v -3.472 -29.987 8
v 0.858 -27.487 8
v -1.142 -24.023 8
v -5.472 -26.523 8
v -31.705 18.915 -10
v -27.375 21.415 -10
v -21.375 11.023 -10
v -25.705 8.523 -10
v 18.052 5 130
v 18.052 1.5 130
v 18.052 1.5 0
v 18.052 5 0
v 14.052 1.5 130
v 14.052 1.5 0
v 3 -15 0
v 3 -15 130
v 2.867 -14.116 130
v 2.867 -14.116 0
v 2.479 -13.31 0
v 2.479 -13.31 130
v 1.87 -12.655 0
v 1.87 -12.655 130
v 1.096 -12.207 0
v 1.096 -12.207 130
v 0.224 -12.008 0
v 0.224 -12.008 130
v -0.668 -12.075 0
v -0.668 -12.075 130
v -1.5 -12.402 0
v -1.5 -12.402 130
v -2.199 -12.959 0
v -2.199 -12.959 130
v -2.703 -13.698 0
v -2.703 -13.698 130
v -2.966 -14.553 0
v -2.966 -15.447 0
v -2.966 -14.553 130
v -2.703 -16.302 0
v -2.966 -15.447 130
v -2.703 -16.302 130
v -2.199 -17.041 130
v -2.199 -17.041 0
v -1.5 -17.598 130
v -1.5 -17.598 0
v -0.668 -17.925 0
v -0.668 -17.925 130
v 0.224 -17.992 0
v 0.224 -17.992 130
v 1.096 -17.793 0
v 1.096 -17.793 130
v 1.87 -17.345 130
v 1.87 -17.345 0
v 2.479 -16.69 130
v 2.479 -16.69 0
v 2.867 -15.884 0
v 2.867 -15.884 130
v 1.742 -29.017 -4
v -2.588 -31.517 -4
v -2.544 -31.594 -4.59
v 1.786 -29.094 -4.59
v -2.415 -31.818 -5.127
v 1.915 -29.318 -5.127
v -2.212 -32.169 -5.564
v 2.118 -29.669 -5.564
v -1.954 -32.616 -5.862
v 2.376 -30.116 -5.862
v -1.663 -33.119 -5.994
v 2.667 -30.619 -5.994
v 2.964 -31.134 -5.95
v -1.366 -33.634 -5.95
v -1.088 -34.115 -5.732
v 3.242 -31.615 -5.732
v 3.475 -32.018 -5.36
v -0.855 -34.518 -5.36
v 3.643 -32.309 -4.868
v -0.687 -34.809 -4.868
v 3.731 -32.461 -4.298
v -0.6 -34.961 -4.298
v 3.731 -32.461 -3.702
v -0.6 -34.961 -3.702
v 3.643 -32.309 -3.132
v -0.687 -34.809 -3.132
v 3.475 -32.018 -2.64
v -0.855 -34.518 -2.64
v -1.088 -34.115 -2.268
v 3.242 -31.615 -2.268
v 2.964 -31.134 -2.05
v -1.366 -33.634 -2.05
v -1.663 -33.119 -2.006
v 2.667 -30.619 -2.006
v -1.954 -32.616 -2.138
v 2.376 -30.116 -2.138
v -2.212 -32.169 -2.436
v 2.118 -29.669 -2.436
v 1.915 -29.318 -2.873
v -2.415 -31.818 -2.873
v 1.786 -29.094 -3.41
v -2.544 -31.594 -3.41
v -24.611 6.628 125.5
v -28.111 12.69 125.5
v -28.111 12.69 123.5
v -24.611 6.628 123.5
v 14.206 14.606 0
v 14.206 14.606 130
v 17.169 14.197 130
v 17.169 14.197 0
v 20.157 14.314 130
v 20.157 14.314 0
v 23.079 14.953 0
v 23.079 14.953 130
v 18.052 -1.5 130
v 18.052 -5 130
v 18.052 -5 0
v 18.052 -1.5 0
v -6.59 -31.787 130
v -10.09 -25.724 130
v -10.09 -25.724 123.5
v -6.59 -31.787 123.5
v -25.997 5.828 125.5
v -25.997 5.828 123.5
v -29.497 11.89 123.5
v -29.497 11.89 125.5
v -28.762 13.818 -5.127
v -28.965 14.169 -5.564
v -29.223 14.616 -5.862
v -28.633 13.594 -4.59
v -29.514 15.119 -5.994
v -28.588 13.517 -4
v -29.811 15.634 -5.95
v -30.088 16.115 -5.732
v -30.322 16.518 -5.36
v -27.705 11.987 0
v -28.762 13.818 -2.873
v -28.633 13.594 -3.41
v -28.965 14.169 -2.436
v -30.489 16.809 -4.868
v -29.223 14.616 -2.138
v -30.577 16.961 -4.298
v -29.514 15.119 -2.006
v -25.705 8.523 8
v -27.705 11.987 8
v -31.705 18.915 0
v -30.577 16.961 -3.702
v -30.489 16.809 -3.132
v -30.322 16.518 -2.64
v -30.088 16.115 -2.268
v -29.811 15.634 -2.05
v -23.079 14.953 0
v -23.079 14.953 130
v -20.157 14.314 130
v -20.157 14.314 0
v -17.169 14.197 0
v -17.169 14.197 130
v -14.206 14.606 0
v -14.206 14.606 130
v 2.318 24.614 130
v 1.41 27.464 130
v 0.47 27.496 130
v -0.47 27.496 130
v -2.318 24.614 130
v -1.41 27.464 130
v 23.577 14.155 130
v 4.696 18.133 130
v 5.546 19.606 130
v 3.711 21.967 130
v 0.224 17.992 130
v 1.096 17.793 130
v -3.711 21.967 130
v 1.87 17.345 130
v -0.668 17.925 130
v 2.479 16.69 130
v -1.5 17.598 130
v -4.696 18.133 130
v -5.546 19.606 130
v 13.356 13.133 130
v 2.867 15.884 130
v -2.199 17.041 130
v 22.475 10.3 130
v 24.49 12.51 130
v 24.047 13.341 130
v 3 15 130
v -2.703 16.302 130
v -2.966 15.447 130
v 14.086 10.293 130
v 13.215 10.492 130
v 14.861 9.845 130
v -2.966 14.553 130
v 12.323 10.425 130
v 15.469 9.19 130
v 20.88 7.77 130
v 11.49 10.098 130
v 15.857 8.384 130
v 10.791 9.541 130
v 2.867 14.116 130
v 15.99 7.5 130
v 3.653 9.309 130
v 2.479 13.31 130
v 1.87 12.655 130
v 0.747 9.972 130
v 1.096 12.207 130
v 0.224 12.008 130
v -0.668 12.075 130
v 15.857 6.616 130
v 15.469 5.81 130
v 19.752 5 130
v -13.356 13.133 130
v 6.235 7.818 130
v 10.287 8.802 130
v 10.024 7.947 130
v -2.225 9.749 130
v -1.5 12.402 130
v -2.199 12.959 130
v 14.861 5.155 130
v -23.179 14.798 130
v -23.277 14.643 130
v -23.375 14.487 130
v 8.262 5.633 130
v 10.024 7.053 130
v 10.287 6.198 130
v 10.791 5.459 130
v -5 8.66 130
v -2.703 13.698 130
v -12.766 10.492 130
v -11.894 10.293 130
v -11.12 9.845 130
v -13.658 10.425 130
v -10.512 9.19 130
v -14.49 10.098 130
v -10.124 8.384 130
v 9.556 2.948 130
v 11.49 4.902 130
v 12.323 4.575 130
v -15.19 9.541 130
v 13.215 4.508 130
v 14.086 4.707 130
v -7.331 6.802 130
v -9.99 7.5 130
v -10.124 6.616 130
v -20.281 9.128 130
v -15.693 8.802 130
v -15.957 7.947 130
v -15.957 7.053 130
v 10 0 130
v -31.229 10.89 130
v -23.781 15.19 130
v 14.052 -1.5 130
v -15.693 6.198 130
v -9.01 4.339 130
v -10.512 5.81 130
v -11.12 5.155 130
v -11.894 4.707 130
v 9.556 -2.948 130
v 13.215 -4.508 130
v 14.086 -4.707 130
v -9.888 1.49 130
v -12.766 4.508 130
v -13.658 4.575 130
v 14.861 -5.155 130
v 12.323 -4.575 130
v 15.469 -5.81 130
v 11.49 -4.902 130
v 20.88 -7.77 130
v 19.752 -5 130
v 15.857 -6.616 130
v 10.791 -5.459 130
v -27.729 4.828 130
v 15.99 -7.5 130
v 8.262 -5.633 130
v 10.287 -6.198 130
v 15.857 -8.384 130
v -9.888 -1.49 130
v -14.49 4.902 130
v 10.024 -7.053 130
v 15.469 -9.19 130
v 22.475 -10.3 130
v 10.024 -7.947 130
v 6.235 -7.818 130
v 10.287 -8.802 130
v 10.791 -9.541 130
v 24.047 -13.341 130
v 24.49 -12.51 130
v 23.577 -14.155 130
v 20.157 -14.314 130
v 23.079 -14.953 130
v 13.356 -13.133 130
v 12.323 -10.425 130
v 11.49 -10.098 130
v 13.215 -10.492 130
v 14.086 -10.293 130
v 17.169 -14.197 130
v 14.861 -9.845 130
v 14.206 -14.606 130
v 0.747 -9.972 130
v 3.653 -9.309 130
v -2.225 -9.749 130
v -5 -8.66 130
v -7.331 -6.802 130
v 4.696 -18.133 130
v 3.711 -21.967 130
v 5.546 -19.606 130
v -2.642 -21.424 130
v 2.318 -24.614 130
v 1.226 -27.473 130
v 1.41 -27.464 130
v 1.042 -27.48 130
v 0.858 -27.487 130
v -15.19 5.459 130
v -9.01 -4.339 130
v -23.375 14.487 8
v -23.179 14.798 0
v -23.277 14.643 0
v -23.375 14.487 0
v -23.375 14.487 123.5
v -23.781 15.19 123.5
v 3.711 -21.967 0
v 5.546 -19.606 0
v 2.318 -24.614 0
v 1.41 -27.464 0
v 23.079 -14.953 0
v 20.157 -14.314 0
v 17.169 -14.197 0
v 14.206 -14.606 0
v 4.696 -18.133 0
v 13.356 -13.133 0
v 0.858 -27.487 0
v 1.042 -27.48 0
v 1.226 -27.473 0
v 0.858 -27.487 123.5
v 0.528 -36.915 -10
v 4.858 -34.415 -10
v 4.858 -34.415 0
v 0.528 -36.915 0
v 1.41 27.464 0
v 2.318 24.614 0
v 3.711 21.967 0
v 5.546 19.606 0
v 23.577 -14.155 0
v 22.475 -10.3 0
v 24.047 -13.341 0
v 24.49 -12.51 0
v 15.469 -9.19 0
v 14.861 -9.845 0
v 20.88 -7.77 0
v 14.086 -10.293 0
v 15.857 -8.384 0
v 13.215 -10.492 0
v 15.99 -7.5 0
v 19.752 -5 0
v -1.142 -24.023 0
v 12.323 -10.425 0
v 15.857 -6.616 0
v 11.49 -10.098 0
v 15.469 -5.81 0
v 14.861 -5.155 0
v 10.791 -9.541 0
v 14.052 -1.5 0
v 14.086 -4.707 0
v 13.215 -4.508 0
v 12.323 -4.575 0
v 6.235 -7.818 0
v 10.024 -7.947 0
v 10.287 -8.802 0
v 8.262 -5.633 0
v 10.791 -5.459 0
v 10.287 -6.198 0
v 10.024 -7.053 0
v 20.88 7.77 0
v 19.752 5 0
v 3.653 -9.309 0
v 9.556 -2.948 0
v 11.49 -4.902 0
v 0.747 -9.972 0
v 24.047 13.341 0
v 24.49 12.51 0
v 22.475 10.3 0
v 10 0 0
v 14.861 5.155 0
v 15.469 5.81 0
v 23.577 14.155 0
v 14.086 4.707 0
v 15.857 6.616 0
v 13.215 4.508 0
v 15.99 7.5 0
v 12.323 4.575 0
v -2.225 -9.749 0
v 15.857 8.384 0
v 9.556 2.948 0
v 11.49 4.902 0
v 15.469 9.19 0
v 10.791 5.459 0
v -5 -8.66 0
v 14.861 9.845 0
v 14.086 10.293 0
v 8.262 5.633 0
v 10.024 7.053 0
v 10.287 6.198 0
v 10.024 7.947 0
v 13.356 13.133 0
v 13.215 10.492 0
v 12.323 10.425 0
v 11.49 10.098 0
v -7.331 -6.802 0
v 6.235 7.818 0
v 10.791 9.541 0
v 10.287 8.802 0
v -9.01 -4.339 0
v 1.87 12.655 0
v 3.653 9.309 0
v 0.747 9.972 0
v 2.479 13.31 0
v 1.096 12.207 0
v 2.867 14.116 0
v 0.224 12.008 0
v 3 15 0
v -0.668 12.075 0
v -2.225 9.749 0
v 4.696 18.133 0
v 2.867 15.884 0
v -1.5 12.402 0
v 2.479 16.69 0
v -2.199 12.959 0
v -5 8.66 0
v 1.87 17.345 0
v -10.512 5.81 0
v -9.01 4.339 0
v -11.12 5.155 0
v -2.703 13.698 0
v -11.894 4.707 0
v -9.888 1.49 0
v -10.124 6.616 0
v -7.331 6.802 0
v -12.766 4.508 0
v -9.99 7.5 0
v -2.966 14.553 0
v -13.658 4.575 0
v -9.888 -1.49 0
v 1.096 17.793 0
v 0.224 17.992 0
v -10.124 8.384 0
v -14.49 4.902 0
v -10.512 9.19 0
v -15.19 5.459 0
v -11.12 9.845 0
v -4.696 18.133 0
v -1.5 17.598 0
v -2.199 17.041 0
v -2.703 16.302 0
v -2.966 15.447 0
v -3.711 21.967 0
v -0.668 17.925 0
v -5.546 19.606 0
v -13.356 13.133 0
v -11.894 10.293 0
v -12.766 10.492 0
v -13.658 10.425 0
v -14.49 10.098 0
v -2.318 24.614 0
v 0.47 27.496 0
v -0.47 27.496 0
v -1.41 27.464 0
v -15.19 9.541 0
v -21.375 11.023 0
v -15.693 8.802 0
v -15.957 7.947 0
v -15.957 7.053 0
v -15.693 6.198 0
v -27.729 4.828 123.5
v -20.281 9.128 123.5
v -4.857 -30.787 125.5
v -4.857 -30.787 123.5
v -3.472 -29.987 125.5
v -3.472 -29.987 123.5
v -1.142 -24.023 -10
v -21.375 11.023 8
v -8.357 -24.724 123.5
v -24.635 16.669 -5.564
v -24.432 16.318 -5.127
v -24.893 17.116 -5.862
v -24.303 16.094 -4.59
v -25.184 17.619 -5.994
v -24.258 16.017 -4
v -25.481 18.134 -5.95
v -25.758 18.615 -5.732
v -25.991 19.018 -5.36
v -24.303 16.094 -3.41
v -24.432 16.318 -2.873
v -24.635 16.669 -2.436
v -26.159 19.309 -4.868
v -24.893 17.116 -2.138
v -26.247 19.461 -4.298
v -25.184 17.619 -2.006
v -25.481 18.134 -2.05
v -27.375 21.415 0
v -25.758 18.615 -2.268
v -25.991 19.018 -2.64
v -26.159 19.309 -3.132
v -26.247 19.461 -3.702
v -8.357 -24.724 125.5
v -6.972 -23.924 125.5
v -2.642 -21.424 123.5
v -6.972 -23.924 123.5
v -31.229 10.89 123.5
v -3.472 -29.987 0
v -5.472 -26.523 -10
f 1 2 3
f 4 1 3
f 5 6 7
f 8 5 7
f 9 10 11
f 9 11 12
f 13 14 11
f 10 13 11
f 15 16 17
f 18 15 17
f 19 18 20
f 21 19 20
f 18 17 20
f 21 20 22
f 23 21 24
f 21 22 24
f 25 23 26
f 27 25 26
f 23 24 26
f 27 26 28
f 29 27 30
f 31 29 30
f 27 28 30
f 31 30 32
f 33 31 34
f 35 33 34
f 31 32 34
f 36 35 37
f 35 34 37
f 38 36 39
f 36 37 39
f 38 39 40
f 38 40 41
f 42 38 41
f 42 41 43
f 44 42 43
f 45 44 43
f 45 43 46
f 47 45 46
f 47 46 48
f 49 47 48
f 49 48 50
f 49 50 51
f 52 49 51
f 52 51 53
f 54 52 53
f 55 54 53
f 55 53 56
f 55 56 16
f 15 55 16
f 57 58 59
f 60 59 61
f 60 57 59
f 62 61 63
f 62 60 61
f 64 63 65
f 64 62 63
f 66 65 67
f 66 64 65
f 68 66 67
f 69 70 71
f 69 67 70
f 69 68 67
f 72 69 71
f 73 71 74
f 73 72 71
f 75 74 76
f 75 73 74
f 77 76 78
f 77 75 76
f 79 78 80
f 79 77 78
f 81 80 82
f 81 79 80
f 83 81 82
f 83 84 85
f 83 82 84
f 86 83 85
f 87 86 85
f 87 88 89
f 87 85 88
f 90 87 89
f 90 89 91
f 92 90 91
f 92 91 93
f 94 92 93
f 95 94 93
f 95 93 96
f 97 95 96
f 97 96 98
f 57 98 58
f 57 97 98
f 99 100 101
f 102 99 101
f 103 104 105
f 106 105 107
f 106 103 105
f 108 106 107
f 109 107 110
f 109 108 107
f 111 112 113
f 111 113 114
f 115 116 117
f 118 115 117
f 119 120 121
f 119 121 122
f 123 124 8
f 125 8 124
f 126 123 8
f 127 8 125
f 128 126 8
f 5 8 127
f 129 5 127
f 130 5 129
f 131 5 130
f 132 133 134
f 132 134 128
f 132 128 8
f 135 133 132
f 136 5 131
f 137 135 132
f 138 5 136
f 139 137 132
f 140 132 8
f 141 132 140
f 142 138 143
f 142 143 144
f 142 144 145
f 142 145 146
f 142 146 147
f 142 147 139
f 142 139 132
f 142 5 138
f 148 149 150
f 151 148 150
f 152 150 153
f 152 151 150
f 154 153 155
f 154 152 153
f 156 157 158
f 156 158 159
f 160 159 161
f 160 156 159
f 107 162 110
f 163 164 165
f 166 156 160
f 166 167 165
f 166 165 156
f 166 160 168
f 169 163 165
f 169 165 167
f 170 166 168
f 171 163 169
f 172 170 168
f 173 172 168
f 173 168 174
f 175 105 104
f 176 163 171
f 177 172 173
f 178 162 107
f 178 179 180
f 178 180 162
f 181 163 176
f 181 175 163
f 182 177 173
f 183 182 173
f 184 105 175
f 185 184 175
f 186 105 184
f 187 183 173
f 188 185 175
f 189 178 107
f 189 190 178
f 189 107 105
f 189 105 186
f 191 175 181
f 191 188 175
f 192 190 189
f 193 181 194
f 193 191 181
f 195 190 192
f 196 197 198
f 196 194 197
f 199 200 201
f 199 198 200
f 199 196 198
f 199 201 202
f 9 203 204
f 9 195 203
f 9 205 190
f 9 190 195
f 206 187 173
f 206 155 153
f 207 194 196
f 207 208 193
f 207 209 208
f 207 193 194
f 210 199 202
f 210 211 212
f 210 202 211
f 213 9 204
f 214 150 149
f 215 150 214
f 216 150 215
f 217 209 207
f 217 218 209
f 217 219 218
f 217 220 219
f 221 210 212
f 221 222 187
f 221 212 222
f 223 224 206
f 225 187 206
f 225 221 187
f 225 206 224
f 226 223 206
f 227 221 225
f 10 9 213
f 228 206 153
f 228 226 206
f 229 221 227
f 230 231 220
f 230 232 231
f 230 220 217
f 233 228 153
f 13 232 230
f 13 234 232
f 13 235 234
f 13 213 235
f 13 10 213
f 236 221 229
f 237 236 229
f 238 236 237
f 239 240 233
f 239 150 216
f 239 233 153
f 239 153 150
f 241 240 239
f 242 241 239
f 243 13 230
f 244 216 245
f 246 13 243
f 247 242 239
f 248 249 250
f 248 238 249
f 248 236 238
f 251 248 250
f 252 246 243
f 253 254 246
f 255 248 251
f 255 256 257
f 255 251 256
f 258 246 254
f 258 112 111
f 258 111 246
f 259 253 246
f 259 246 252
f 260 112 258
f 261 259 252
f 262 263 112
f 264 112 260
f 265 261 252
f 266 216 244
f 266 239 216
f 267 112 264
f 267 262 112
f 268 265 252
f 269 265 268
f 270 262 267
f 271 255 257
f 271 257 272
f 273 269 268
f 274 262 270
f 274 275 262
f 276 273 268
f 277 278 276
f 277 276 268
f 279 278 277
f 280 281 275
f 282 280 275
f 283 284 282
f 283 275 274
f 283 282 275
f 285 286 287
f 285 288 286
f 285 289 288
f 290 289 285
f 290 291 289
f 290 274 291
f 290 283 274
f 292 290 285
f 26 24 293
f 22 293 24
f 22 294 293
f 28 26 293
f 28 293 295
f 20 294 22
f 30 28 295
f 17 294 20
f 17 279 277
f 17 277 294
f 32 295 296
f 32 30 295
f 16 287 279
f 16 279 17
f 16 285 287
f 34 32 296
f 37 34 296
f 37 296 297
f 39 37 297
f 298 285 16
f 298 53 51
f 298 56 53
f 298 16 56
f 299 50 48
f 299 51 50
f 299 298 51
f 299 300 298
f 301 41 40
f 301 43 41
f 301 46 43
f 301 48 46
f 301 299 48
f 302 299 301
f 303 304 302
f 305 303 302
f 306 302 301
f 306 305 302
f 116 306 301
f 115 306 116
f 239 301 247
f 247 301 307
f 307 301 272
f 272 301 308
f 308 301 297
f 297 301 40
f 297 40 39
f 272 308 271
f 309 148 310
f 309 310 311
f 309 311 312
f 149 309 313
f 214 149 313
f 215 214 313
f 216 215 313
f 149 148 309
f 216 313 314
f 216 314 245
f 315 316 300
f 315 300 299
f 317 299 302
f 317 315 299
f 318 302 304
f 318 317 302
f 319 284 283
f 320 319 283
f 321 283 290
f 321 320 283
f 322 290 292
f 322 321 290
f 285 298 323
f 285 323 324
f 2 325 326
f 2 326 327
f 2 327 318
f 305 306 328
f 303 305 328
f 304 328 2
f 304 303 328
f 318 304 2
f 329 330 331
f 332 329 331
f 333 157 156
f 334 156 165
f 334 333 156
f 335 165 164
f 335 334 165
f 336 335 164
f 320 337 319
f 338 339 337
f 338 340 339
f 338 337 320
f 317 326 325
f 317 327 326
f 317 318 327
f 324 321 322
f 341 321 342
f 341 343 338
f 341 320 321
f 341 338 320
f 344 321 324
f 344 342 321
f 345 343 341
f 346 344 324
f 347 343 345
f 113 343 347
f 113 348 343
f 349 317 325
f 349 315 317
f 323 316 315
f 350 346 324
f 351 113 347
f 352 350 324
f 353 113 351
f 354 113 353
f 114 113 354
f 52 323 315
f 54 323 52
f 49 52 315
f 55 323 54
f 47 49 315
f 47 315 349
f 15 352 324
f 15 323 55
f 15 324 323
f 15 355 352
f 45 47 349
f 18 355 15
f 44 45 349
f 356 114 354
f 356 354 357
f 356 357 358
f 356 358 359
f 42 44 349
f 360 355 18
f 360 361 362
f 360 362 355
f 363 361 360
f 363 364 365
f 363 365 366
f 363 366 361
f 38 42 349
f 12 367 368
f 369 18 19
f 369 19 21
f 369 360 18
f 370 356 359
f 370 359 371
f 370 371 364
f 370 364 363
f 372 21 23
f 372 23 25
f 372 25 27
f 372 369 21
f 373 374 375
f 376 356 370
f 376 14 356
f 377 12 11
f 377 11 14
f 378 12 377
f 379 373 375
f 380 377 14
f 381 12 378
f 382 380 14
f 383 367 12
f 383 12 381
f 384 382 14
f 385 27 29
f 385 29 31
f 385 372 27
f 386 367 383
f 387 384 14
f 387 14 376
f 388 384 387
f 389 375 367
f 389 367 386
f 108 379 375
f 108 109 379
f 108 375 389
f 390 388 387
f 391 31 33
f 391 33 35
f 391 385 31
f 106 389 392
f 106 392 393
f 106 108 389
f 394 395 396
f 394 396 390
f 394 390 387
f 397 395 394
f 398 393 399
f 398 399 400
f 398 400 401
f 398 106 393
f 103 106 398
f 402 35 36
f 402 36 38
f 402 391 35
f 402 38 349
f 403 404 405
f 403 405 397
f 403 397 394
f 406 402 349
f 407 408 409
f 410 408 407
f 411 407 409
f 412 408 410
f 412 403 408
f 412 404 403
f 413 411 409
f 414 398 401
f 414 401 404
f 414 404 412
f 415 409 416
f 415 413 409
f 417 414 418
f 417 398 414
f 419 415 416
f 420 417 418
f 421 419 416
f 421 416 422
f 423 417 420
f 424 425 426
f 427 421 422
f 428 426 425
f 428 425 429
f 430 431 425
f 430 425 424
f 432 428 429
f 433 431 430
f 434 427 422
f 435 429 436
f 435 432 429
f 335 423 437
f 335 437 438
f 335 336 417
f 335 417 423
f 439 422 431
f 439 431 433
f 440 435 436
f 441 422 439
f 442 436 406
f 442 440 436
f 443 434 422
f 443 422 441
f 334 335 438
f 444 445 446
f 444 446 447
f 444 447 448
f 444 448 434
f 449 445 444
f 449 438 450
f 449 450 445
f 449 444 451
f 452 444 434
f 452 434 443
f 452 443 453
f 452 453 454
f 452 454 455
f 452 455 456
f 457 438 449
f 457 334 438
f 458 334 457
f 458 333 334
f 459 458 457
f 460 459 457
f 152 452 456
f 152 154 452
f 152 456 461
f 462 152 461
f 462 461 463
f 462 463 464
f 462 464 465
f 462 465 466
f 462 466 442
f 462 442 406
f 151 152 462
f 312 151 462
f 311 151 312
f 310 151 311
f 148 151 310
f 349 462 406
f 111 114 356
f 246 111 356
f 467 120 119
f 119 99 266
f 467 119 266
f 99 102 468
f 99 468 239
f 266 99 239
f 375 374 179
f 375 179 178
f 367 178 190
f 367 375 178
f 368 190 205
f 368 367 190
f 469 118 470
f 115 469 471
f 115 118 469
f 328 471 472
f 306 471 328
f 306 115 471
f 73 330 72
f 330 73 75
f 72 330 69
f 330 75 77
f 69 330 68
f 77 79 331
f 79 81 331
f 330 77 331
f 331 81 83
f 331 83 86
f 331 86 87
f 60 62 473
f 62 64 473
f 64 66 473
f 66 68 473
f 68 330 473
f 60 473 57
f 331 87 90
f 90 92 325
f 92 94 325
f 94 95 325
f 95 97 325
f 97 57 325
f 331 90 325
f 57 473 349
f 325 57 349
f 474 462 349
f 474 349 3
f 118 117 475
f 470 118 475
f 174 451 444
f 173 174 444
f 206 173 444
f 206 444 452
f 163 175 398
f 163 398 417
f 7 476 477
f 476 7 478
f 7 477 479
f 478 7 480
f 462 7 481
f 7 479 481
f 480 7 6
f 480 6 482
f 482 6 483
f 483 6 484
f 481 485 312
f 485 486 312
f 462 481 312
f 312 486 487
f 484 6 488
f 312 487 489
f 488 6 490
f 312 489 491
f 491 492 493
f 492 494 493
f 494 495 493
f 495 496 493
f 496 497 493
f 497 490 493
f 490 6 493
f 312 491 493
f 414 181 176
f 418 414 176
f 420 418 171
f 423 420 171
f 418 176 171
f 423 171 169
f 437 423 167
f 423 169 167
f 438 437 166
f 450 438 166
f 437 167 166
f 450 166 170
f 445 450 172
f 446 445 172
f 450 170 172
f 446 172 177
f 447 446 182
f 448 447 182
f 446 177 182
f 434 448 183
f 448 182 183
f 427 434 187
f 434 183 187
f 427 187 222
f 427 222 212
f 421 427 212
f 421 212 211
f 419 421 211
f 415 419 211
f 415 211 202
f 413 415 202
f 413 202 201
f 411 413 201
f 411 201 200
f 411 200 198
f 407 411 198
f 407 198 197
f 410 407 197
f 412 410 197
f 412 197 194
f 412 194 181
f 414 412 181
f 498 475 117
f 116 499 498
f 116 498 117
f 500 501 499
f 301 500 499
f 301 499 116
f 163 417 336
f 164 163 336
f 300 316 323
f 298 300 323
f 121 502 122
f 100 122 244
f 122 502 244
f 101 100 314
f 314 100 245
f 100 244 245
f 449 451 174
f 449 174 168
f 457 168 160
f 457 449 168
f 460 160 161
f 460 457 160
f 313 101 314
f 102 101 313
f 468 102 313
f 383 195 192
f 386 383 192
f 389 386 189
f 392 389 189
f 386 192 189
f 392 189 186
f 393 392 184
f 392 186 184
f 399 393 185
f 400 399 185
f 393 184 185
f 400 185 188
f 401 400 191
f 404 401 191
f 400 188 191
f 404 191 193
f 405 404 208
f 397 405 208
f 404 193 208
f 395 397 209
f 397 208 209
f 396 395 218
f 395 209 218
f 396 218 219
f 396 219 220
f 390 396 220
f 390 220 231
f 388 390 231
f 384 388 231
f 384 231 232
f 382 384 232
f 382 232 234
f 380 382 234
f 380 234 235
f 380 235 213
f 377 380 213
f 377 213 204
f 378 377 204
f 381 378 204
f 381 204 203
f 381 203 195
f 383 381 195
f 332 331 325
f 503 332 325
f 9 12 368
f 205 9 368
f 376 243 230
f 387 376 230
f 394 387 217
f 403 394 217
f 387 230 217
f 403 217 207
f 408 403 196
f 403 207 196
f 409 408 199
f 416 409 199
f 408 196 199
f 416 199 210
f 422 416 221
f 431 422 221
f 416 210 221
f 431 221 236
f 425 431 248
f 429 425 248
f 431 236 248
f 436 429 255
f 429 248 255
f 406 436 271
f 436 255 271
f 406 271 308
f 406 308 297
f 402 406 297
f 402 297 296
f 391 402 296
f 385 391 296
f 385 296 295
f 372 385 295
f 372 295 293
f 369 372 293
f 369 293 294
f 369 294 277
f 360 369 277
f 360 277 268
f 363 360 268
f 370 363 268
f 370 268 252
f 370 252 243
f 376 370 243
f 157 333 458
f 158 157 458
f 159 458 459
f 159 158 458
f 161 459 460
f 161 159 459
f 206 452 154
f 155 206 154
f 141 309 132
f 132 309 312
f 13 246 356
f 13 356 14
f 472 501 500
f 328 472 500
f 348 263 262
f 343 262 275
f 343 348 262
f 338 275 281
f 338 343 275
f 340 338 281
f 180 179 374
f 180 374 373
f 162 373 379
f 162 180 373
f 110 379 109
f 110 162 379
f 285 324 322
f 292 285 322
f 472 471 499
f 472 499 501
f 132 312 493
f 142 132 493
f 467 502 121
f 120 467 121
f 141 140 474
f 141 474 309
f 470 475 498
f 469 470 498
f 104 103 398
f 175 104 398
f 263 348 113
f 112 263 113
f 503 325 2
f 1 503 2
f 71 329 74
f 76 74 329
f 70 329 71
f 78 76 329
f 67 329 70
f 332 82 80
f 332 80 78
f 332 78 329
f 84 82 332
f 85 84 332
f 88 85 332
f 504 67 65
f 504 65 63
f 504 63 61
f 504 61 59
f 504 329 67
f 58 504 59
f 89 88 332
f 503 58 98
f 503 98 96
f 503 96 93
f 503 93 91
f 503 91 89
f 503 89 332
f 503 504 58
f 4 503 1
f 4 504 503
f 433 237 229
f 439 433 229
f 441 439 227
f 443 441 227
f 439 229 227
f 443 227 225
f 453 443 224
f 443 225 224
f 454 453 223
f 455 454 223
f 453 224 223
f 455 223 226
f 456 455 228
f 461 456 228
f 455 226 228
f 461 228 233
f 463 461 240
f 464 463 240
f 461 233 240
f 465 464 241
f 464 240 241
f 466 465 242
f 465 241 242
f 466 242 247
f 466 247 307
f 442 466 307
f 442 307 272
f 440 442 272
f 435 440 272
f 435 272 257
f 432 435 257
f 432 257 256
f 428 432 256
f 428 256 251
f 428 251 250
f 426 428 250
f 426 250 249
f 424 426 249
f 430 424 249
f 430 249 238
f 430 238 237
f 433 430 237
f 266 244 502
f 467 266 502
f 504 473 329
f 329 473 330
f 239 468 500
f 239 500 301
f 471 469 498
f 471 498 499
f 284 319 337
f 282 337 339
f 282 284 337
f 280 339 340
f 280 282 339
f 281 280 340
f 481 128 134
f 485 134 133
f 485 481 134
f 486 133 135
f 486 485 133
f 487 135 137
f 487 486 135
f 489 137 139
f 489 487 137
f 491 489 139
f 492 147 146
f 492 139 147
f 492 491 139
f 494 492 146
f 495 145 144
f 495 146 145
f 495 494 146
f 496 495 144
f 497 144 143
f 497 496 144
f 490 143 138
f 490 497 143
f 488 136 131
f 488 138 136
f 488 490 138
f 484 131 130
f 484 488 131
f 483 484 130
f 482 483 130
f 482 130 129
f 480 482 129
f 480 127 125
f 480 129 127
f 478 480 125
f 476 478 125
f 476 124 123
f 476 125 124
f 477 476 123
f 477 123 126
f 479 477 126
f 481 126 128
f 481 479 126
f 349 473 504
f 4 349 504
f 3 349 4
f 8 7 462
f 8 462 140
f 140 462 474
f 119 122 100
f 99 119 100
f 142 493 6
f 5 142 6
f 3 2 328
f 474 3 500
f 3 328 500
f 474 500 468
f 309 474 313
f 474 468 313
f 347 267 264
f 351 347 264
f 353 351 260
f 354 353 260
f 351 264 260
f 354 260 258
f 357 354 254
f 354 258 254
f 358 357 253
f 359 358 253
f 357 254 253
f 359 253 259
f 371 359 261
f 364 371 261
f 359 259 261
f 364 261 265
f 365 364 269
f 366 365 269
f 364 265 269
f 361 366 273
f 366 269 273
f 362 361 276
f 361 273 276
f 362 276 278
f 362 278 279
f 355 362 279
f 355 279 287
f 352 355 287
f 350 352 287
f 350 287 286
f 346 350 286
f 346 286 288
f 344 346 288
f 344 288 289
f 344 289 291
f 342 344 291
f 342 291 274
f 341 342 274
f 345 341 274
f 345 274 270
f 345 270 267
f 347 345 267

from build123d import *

# Parameters (mm, degrees)
BOSS_EXTRU_1_DEPTH      = 130
ESQUISSE4_R             = 54.250129783
ESQUISSE4_R_2           = 27.5
ENL_V_MAT_EXTRU_1_DEPTH = 150.53980461
ESQUISSE5_R             = 10
ESQUISSE5_R_2           = 3
ENL_V_MAT_EXTRU_2_DEPTH = 136.114727886
BOSS_EXTRU_2_DEPTH      = 5
ESQUISSE6_R             = 2
ENL_V_MAT_EXTRU_3_DEPTH = 140.046443052
BOSS_EXTRU_3_DEPTH      = 49.27879
ENL_V_START             = -8.6
ESQUISSE9_W             = 6.5
ESQUISSE9_H             = 35.278790482
ESQUISSE9_W_2           = 18
ESQUISSE9_H_2           = 40.466483264
ENL_V_MAT_EXTRU_4_DEPTH = 8.6


with BuildPart() as part:
    # Esquisse1 → Boss.-Extru.1 (new body)
    with BuildSketch(Plane.XY):
        with BuildLine():
            Line((-18, -51.176914536), (-18, -48.176914536))
            ThreePointArc((-18, -48.176914536), (-9.5, -16.454482672), (-32.722431864, -39.676914536))
            Line((-32.722431864, -39.676914536), (-35.320508076, -41.176914536))
            ThreePointArc((-35.320508076, -41.176914536), (-37.98683472, -30.451354144), (-34.549834435, -19.947356212))
            ThreePointArc((-34.549834435, -19.947356212), (-45.365063628, -17.671886805), (-53.320508076, -10))
            Line((-53.320508076, -10), (-50.722431864, -8.5))
            ThreePointArc((-50.722431864, -8.5), (-19, 0), (-50.722431864, 8.5))
            Line((-50.722431864, 8.5), (-53.320508076, 10))
            ThreePointArc((-53.320508076, 10), (-45.365063628, 17.671886805), (-34.549834435, 19.947356212))
            ThreePointArc((-34.549834435, 19.947356212), (-37.98683472, 30.451354144), (-35.320508076, 41.176914536))
            Line((-35.320508076, 41.176914536), (-32.722431864, 39.676914536))
            ThreePointArc((-32.722431864, 39.676914536), (-9.5, 16.454482672), (-18, 48.176914536))
            Line((-18, 48.176914536), (-18, 51.176914536))
            ThreePointArc((-18, 51.176914536), (-7.378228908, 48.123240948), (0, 39.894712423))
            ThreePointArc((0, 39.894712423), (7.378228908, 48.123240948), (18, 51.176914536))
            Line((18, 51.176914536), (18, 48.176914536))
            ThreePointArc((18, 48.176914536), (9.5, 16.454482672), (32.722431864, 39.676914536))
            Line((32.722431864, 39.676914536), (35.320508076, 41.176914536))
            ThreePointArc((35.320508076, 41.176914536), (37.98683472, 30.451354144), (34.549834435, 19.947356212))
            ThreePointArc((34.549834435, 19.947356212), (45.365063628, 17.671886805), (53.320508076, 10))
            Line((53.320508076, 10), (50.722431864, 8.5))
            ThreePointArc((50.722431864, 8.5), (19, 0), (50.722431864, -8.5))
            Line((50.722431864, -8.5), (53.320508076, -10))
            ThreePointArc((53.320508076, -10), (45.365063628, -17.671886805), (34.549834435, -19.947356212))
            ThreePointArc((34.549834435, -19.947356212), (37.98683472, -30.451354144), (35.320508076, -41.176914536))
            Line((35.320508076, -41.176914536), (32.722431864, -39.676914536))
            ThreePointArc((32.722431864, -39.676914536), (9.5, -16.454482672), (18, -48.176914536))
            Line((18, -48.176914536), (18, -51.176914536))
            ThreePointArc((18, -51.176914536), (7.378228908, -48.123240948), (0, -39.894712423))
            ThreePointArc((0, -39.894712423), (-7.378228908, -48.123240948), (-18, -51.176914536))
        make_face()
    extrude(amount=BOSS_EXTRU_1_DEPTH)

    # Esquisse4 → Enlèv. mat.-Extru.1 (cut, through all)
    with BuildSketch(Plane.XY.offset(130)):
        Circle(ESQUISSE4_R)
        Circle(ESQUISSE4_R_2, mode=Mode.SUBTRACT)
    extrude(amount=-ENL_V_MAT_EXTRU_1_DEPTH, mode=Mode.SUBTRACT)

    # Esquisse5 → Enlèv. mat.-Extru.2 (cut, through all)
    with BuildSketch(Plane.XY.offset(130)):
        Circle(ESQUISSE5_R)
        with Locations((0, 15)):
            Circle(ESQUISSE5_R_2)
        with Locations((12.990381057, 7.5)):
            Circle(ESQUISSE5_R_2)
        with Locations((12.990381057, -7.5)):
            Circle(ESQUISSE5_R_2)
        with Locations((0, -15)):
            Circle(ESQUISSE5_R_2)
        with Locations((-12.990381057, 7.5)):
            Circle(ESQUISSE5_R_2)
        Polygon((14.206088614, -14.605667257), (5.545834576, -19.605667257), (4.695834576, -18.13342407), (13.356088614, -13.13342407), align=None)
        Polygon((18.051923191, 5), (19.751923191, 5), (19.751923191, -5), (18.051923191, -5), (18.051923191, -1.5), (14.051923191, -1.5), (14.051923191, 1.5), (18.051923191, 1.5), align=None)
        Polygon((-14.206088614, 14.605667257), (-5.545834576, 19.605667257), (-4.695834576, 18.13342407), (-13.356088614, 13.13342407), align=None)
        Polygon((5.545834576, 19.605667257), (14.206088614, 14.605667257), (13.356088614, 13.13342407), (4.695834576, 18.13342407), align=None)
        Polygon((0.986461417, -27.708601295), (-23.503121916, 14.708601295), (-40.823629992, 4.708601295), (-16.334046658, -37.708601295), align=None)
    extrude(amount=-ENL_V_MAT_EXTRU_2_DEPTH, mode=Mode.SUBTRACT)

    # Esquisse7 → Boss.-Extru.2 (add)
    with BuildSketch(Plane(origin=(-11.258330249, -6.5, 0), x_dir=(0, 0, 1), z_dir=(-0.8660254037844403, -0.49999999999999717, 0))):
        Polygon((8, 24.233241632), (0, 24.233241632), (0, 32.233241632), (-10, 32.233241632), (-10, -32.233241632), (0, -32.233241632), (0, -24.233241632), (8, -24.233241632), align=None)
    extrude(amount=BOSS_EXTRU_2_DEPTH)

    # Esquisse6 → Enlèv. mat.-Extru.3 (cut, through all)
    with BuildSketch(Plane(origin=(-11.258330249, -6.5, 0), x_dir=(0, 0, 1), z_dir=(-0.8660254037844403, -0.49999999999999717, 0))):
        with Locations(Location((-4, 28, 0), (0, 0, 270))):
            Circle(ESQUISSE6_R)
        with Locations(Location((-4, -28, 0), (0, 0, 90))):
            Circle(ESQUISSE6_R)
    extrude(amount=ENL_V_MAT_EXTRU_3_DEPTH, mode=Mode.SUBTRACT)

    # Esquisse8 → Boss.-Extru.3 (add)
    with BuildSketch(Plane(origin=(12.116620816, -20.986602869, 0), x_dir=(0.8660254037844403, 0.4999999999999971, 0), z_dir=(0.49999999999999717, -0.8660254037844404, 0))):
        Polygon((-13, 130), (-21.6, 130), (-21.6, 123.5), (-19.6, 123.5), (-19.6, 125.5), (-18, 125.5), (-18, 123.5), (-13, 123.5), align=None)
    extrude(amount=-BOSS_EXTRU_3_DEPTH)

    # Esquisse9 → Enlèv. mat.-Extru.4 (cut)
    with BuildSketch(Plane(origin=(-18.706148722, -10.8, 0), x_dir=(0, 0, 1), z_dir=(-0.8660254037844403, -0.49999999999999734, 0)).offset(ENL_V_START)):
        with Locations((126.75, 0.406153609)):
            Rectangle(ESQUISSE9_W, ESQUISSE9_H)
        with Locations((-1, 0)):
            Rectangle(ESQUISSE9_W_2, ESQUISSE9_H_2)
    extrude(amount=ENL_V_MAT_EXTRU_4_DEPTH, mode=Mode.SUBTRACT)


solid = part.part
